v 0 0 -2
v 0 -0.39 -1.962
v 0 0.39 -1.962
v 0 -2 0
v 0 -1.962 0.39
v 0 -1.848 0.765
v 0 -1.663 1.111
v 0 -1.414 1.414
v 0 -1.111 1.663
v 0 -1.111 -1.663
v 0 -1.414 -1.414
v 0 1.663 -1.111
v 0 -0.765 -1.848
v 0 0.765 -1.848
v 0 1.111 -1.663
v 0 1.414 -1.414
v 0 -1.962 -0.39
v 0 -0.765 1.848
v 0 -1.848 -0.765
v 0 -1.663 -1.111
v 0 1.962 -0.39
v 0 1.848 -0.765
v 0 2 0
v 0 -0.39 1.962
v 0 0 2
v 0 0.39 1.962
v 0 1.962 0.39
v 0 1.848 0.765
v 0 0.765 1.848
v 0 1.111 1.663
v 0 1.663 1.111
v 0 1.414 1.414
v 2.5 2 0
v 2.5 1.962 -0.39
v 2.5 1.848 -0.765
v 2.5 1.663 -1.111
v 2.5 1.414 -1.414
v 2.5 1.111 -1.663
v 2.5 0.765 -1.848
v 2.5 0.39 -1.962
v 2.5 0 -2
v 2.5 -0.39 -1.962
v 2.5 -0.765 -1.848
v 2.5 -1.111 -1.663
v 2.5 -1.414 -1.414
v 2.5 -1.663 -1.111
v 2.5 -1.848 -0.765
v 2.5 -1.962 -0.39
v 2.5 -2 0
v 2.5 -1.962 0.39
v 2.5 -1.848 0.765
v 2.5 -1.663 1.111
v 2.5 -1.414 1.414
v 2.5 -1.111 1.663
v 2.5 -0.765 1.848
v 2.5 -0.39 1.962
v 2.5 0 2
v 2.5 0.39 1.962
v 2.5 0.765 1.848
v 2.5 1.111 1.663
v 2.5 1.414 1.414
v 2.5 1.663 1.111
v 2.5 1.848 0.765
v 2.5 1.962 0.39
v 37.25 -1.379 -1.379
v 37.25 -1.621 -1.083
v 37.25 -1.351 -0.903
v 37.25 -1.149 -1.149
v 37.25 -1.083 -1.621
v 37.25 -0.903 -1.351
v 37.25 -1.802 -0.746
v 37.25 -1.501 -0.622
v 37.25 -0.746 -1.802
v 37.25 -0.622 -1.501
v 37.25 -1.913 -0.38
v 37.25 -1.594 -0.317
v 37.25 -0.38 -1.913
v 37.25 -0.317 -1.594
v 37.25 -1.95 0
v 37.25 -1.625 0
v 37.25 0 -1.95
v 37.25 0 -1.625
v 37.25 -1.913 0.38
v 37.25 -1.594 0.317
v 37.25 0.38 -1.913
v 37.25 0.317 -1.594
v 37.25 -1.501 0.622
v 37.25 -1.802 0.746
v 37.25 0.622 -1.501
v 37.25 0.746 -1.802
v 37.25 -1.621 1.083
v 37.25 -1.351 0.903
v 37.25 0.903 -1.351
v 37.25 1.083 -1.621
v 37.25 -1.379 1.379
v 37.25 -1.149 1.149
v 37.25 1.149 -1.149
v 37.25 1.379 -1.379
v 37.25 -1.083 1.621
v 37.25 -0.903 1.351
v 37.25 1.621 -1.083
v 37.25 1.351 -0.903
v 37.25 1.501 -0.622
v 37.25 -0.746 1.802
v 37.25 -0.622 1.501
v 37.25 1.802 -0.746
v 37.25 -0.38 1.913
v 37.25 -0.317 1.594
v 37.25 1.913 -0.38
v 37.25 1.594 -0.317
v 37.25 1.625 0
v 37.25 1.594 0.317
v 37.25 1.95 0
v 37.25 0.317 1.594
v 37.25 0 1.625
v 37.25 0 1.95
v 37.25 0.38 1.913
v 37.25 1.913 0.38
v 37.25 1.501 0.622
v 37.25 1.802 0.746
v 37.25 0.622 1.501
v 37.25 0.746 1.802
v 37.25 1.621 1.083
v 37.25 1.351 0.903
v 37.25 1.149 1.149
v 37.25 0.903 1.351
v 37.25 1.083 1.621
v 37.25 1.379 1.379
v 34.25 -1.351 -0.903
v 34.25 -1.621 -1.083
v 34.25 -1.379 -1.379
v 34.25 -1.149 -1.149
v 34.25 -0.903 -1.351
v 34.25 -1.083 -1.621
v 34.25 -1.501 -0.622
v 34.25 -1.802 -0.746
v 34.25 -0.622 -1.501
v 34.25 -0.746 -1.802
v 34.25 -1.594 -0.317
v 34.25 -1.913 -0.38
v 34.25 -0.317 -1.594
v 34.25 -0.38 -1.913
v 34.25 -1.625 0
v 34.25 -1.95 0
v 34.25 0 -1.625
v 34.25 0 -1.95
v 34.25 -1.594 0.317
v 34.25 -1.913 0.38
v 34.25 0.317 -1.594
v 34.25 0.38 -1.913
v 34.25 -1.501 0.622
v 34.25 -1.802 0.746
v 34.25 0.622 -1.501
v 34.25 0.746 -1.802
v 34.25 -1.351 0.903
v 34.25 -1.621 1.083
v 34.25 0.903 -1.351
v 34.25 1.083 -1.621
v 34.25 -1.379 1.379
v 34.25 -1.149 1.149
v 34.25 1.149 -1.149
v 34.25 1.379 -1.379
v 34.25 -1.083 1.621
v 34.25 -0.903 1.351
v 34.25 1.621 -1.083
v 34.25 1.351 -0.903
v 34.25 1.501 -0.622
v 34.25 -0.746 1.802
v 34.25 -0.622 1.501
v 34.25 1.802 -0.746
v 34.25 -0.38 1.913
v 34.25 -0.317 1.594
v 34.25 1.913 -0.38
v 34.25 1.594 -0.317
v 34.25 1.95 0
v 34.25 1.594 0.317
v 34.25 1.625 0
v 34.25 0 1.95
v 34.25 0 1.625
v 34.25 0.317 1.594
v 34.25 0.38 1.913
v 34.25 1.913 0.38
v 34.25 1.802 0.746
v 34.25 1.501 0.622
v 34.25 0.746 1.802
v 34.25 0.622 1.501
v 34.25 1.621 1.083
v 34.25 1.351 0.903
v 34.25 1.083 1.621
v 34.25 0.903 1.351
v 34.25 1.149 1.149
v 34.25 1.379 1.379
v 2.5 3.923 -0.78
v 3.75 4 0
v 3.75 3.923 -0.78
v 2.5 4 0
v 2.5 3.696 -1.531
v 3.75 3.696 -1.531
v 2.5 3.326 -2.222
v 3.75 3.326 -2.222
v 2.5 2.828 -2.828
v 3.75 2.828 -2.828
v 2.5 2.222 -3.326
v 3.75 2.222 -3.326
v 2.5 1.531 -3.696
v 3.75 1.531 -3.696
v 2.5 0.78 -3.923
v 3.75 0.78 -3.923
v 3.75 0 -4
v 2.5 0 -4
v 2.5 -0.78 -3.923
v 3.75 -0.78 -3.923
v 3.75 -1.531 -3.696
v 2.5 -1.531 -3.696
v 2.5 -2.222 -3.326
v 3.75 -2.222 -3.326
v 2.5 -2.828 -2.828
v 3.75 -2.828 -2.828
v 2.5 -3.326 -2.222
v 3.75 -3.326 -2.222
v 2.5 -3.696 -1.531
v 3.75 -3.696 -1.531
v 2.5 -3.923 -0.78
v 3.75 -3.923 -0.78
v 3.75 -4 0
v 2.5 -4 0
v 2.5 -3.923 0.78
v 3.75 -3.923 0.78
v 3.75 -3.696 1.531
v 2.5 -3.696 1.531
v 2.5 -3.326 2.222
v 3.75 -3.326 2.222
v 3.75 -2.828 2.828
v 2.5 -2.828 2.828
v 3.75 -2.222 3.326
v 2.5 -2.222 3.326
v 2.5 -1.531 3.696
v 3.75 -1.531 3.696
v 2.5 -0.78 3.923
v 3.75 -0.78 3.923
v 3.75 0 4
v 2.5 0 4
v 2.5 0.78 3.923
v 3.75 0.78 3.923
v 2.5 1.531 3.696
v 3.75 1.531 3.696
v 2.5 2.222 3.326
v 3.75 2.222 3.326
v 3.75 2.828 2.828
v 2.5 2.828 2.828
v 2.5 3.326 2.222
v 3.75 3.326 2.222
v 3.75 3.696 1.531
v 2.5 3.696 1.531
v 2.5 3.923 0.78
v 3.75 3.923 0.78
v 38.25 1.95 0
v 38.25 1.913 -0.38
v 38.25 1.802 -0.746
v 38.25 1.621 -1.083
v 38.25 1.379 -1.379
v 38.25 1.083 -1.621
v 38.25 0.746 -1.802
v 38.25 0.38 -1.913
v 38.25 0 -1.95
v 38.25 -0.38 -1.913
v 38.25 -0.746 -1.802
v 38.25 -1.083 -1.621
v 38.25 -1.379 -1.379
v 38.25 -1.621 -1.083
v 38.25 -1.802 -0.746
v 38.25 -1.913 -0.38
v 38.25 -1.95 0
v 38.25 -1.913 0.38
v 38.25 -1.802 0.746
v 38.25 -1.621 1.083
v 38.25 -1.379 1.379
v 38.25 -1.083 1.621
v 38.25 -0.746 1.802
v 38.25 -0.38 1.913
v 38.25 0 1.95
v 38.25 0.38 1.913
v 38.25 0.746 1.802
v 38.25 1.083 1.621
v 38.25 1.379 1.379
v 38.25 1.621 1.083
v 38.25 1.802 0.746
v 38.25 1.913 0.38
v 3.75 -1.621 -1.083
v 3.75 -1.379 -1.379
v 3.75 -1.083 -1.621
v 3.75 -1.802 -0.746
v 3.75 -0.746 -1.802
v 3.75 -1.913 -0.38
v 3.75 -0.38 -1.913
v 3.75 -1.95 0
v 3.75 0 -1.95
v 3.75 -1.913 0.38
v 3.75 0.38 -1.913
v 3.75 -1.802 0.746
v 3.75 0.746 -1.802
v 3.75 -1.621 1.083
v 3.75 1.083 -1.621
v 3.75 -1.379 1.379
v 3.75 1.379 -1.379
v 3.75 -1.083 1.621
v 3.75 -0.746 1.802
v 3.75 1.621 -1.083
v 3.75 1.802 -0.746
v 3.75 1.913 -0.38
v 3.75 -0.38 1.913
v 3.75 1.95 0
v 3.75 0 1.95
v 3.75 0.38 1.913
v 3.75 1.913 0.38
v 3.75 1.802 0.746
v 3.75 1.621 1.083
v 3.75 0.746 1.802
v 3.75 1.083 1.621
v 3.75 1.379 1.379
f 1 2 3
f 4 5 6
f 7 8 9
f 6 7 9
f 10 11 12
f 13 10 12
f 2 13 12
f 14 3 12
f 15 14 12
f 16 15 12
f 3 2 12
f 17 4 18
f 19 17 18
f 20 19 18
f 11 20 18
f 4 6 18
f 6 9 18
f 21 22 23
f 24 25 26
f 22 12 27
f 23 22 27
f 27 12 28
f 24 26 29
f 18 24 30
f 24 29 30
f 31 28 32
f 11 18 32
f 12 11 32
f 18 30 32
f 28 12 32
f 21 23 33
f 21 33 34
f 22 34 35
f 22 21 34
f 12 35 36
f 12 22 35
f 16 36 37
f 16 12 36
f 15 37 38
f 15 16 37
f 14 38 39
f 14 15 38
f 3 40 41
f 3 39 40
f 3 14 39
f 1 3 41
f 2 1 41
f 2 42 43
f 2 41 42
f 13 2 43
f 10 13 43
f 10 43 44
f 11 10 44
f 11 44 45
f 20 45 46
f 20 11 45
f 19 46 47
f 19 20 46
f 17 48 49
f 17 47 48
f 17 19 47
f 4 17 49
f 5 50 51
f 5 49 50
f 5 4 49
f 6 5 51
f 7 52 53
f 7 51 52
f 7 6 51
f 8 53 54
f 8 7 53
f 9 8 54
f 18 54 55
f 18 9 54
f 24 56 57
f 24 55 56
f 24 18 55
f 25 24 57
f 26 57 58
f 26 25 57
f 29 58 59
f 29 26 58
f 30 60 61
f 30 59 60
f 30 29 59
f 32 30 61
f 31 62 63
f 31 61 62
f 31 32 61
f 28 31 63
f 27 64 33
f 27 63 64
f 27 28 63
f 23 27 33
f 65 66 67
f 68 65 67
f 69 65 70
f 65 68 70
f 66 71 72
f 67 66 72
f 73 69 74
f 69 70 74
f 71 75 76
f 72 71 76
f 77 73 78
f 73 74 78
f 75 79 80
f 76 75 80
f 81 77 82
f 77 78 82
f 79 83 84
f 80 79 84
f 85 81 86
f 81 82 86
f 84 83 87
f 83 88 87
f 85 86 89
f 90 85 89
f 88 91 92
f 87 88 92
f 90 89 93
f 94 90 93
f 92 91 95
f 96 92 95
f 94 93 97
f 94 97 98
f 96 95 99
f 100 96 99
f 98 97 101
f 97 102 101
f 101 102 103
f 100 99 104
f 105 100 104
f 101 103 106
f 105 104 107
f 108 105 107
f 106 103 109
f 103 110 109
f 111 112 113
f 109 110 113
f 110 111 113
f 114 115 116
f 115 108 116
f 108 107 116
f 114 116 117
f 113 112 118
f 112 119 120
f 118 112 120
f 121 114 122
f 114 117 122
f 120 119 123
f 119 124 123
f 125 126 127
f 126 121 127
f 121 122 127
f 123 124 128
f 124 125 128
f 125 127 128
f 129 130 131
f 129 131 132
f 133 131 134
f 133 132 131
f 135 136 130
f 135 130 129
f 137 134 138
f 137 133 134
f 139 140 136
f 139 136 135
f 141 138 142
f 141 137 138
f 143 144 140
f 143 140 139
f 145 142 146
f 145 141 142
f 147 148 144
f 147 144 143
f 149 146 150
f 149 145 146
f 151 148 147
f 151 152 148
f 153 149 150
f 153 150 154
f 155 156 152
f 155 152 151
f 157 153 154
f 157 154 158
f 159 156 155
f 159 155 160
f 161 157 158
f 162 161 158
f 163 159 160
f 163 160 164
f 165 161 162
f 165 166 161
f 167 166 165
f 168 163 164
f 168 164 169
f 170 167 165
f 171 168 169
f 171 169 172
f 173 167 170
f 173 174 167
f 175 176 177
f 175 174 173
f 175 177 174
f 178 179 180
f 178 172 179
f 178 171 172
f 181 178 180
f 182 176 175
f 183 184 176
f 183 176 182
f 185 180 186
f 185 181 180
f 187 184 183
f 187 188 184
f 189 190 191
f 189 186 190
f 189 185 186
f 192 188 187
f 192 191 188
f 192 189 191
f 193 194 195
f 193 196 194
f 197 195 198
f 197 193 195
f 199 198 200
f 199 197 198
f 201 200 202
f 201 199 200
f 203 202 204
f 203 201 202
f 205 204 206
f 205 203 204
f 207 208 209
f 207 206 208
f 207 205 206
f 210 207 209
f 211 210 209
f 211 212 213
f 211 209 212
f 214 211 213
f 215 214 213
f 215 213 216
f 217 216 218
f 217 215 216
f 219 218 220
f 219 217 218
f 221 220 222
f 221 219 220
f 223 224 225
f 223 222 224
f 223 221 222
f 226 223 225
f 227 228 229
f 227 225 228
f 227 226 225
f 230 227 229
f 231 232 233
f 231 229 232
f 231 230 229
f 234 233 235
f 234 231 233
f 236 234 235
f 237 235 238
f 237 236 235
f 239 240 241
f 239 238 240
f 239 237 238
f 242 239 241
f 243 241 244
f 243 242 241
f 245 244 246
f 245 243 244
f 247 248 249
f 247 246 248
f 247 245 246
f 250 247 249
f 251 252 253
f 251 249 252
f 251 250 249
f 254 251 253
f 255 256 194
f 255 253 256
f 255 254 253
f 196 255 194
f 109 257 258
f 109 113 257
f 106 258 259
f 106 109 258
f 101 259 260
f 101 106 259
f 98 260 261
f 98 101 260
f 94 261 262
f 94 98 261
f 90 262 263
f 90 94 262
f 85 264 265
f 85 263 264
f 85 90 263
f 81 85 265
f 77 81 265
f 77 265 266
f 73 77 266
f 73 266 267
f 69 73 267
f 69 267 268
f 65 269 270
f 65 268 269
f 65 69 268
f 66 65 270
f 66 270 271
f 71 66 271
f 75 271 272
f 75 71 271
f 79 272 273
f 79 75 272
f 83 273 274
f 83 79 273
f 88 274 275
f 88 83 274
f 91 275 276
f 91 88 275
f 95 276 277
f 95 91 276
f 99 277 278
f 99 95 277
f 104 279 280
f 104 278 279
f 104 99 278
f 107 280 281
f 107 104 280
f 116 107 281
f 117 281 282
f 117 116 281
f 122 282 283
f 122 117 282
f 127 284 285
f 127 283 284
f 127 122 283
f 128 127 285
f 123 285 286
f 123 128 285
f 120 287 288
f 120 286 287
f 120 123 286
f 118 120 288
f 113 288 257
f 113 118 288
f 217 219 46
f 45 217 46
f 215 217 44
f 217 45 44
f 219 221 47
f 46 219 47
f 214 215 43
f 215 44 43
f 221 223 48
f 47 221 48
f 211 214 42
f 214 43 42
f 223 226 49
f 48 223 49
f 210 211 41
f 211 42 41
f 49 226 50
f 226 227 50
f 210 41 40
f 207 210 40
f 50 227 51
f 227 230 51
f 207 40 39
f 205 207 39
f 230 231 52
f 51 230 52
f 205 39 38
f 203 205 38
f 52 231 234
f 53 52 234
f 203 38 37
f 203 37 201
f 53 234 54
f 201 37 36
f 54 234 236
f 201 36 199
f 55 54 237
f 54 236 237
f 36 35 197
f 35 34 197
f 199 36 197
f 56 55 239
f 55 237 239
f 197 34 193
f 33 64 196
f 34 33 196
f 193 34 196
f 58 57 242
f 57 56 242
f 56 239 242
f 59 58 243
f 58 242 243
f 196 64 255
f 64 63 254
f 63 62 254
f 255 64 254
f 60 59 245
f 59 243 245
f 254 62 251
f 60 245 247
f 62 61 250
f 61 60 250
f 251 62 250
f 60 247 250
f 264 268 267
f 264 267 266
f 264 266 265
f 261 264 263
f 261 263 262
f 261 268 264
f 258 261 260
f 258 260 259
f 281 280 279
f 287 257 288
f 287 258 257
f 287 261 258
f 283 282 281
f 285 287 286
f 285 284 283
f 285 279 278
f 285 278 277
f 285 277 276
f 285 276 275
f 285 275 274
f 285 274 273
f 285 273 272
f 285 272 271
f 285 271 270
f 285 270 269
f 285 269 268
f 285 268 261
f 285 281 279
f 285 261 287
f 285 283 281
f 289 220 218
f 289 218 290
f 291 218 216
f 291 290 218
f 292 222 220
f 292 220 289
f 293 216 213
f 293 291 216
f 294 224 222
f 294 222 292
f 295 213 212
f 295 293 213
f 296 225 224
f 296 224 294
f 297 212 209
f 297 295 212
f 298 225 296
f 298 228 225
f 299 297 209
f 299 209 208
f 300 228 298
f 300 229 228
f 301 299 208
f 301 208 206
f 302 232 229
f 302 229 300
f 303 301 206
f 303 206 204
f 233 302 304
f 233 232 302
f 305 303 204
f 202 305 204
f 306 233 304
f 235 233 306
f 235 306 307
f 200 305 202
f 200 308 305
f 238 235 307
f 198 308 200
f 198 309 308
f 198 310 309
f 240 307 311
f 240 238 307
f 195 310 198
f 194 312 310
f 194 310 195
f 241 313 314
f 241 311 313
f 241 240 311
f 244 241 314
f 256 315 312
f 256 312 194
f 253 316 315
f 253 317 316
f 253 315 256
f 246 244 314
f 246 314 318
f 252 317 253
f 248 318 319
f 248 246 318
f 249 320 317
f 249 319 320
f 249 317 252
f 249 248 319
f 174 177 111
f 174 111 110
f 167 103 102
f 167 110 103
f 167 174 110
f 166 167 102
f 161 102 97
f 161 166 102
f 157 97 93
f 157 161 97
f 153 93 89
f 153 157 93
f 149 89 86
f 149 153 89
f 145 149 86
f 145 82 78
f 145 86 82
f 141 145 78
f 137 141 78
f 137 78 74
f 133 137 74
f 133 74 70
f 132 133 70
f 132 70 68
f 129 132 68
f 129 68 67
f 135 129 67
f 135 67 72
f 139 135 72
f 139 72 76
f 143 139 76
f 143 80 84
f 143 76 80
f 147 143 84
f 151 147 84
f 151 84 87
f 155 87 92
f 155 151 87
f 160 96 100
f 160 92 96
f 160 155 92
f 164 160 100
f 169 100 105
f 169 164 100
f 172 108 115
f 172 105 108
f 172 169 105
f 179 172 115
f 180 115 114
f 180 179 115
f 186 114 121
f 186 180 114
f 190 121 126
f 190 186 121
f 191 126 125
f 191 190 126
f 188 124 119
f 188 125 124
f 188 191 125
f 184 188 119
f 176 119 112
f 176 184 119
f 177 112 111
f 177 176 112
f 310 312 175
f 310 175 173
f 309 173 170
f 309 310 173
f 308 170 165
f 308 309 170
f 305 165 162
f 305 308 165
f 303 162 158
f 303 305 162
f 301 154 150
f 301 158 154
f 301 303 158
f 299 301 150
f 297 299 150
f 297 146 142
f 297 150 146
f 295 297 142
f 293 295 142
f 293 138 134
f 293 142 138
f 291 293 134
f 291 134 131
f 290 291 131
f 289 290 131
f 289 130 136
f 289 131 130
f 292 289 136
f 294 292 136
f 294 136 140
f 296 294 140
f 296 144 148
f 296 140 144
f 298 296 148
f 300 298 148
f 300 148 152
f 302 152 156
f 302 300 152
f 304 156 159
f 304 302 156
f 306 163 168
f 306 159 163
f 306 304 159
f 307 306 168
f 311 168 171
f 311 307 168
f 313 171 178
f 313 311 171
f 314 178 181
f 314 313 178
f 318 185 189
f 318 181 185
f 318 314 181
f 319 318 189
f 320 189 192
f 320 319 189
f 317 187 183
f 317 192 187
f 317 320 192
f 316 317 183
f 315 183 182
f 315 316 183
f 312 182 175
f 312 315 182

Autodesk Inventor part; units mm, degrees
ref_plane "YZ Plane" through (0, 0, 0) normal (1, 0, 0) x (0, 1, 0)
ref_plane "XZ Plane" through (0, 0, 0) normal (0, 1, 0) x (-1, 0, 0)
ref_plane "XY Plane" through (0, 0, 0) normal (0, 0, 1) x (1, 0, 0)
sketch "Sketch1" plane through (0, 0, 0) normal (0, 0, 1) x (1, 0, 0)
  line L0 (0, 0) -> (2.5, 0)
  line L1 (2.5, 0) -> (2.5, 2)
  line L2 (2.5, 2) -> (0, 2)
  line L3 (0, 2) -> (0, 0)
  line L4 (2.5, 0) -> (3.75, 0)
  line L5 (3.75, 0) -> (3.75, 4)
  line L6 (3.75, 4) -> (2.5, 4)
  line L7 (2.5, 4) -> (2.5, 0)
  line L8 (3.75, 0) -> (34.25, 0)
  line L9 (34.25, 0) -> (34.25, 1.95)
  line L10 (34.25, 1.95) -> (3.75, 1.95)
  line L11 (3.75, 1.95) -> (3.75, 0)
  line L12 (34.25, 0) -> (37.25, 0)
  line L13 (37.25, 0) -> (37.25, 1.625)
  line L14 (37.25, 1.625) -> (34.25, 1.625)
  line L15 (34.25, 1.625) -> (34.25, 0)
  line L16 (37.25, 0) -> (38.25, 0)
  line L17 (38.25, 0) -> (38.25, 1.95)
  line L18 (38.25, 1.95) -> (37.25, 1.95)
  line L19 (37.25, 1.95) -> (37.25, 0)
  dimension "d0" = 4
  dimension "d1" = 8
  dimension "d2" = 3.9
  dimension "d3" = 3.25
  dimension "d4" = 2.5
  dimension "d5" = 3.75
  dimension "d6" = 34.25
  dimension "d7" = 37.25
  dimension "d8" = 38.25
revolve "Revolution1" add sketch "Sketch1" angle 360 about axis through (3.75, 0, 0) along (1, 0, 0)
properties part number "403-06" material "Steel, Mild"
